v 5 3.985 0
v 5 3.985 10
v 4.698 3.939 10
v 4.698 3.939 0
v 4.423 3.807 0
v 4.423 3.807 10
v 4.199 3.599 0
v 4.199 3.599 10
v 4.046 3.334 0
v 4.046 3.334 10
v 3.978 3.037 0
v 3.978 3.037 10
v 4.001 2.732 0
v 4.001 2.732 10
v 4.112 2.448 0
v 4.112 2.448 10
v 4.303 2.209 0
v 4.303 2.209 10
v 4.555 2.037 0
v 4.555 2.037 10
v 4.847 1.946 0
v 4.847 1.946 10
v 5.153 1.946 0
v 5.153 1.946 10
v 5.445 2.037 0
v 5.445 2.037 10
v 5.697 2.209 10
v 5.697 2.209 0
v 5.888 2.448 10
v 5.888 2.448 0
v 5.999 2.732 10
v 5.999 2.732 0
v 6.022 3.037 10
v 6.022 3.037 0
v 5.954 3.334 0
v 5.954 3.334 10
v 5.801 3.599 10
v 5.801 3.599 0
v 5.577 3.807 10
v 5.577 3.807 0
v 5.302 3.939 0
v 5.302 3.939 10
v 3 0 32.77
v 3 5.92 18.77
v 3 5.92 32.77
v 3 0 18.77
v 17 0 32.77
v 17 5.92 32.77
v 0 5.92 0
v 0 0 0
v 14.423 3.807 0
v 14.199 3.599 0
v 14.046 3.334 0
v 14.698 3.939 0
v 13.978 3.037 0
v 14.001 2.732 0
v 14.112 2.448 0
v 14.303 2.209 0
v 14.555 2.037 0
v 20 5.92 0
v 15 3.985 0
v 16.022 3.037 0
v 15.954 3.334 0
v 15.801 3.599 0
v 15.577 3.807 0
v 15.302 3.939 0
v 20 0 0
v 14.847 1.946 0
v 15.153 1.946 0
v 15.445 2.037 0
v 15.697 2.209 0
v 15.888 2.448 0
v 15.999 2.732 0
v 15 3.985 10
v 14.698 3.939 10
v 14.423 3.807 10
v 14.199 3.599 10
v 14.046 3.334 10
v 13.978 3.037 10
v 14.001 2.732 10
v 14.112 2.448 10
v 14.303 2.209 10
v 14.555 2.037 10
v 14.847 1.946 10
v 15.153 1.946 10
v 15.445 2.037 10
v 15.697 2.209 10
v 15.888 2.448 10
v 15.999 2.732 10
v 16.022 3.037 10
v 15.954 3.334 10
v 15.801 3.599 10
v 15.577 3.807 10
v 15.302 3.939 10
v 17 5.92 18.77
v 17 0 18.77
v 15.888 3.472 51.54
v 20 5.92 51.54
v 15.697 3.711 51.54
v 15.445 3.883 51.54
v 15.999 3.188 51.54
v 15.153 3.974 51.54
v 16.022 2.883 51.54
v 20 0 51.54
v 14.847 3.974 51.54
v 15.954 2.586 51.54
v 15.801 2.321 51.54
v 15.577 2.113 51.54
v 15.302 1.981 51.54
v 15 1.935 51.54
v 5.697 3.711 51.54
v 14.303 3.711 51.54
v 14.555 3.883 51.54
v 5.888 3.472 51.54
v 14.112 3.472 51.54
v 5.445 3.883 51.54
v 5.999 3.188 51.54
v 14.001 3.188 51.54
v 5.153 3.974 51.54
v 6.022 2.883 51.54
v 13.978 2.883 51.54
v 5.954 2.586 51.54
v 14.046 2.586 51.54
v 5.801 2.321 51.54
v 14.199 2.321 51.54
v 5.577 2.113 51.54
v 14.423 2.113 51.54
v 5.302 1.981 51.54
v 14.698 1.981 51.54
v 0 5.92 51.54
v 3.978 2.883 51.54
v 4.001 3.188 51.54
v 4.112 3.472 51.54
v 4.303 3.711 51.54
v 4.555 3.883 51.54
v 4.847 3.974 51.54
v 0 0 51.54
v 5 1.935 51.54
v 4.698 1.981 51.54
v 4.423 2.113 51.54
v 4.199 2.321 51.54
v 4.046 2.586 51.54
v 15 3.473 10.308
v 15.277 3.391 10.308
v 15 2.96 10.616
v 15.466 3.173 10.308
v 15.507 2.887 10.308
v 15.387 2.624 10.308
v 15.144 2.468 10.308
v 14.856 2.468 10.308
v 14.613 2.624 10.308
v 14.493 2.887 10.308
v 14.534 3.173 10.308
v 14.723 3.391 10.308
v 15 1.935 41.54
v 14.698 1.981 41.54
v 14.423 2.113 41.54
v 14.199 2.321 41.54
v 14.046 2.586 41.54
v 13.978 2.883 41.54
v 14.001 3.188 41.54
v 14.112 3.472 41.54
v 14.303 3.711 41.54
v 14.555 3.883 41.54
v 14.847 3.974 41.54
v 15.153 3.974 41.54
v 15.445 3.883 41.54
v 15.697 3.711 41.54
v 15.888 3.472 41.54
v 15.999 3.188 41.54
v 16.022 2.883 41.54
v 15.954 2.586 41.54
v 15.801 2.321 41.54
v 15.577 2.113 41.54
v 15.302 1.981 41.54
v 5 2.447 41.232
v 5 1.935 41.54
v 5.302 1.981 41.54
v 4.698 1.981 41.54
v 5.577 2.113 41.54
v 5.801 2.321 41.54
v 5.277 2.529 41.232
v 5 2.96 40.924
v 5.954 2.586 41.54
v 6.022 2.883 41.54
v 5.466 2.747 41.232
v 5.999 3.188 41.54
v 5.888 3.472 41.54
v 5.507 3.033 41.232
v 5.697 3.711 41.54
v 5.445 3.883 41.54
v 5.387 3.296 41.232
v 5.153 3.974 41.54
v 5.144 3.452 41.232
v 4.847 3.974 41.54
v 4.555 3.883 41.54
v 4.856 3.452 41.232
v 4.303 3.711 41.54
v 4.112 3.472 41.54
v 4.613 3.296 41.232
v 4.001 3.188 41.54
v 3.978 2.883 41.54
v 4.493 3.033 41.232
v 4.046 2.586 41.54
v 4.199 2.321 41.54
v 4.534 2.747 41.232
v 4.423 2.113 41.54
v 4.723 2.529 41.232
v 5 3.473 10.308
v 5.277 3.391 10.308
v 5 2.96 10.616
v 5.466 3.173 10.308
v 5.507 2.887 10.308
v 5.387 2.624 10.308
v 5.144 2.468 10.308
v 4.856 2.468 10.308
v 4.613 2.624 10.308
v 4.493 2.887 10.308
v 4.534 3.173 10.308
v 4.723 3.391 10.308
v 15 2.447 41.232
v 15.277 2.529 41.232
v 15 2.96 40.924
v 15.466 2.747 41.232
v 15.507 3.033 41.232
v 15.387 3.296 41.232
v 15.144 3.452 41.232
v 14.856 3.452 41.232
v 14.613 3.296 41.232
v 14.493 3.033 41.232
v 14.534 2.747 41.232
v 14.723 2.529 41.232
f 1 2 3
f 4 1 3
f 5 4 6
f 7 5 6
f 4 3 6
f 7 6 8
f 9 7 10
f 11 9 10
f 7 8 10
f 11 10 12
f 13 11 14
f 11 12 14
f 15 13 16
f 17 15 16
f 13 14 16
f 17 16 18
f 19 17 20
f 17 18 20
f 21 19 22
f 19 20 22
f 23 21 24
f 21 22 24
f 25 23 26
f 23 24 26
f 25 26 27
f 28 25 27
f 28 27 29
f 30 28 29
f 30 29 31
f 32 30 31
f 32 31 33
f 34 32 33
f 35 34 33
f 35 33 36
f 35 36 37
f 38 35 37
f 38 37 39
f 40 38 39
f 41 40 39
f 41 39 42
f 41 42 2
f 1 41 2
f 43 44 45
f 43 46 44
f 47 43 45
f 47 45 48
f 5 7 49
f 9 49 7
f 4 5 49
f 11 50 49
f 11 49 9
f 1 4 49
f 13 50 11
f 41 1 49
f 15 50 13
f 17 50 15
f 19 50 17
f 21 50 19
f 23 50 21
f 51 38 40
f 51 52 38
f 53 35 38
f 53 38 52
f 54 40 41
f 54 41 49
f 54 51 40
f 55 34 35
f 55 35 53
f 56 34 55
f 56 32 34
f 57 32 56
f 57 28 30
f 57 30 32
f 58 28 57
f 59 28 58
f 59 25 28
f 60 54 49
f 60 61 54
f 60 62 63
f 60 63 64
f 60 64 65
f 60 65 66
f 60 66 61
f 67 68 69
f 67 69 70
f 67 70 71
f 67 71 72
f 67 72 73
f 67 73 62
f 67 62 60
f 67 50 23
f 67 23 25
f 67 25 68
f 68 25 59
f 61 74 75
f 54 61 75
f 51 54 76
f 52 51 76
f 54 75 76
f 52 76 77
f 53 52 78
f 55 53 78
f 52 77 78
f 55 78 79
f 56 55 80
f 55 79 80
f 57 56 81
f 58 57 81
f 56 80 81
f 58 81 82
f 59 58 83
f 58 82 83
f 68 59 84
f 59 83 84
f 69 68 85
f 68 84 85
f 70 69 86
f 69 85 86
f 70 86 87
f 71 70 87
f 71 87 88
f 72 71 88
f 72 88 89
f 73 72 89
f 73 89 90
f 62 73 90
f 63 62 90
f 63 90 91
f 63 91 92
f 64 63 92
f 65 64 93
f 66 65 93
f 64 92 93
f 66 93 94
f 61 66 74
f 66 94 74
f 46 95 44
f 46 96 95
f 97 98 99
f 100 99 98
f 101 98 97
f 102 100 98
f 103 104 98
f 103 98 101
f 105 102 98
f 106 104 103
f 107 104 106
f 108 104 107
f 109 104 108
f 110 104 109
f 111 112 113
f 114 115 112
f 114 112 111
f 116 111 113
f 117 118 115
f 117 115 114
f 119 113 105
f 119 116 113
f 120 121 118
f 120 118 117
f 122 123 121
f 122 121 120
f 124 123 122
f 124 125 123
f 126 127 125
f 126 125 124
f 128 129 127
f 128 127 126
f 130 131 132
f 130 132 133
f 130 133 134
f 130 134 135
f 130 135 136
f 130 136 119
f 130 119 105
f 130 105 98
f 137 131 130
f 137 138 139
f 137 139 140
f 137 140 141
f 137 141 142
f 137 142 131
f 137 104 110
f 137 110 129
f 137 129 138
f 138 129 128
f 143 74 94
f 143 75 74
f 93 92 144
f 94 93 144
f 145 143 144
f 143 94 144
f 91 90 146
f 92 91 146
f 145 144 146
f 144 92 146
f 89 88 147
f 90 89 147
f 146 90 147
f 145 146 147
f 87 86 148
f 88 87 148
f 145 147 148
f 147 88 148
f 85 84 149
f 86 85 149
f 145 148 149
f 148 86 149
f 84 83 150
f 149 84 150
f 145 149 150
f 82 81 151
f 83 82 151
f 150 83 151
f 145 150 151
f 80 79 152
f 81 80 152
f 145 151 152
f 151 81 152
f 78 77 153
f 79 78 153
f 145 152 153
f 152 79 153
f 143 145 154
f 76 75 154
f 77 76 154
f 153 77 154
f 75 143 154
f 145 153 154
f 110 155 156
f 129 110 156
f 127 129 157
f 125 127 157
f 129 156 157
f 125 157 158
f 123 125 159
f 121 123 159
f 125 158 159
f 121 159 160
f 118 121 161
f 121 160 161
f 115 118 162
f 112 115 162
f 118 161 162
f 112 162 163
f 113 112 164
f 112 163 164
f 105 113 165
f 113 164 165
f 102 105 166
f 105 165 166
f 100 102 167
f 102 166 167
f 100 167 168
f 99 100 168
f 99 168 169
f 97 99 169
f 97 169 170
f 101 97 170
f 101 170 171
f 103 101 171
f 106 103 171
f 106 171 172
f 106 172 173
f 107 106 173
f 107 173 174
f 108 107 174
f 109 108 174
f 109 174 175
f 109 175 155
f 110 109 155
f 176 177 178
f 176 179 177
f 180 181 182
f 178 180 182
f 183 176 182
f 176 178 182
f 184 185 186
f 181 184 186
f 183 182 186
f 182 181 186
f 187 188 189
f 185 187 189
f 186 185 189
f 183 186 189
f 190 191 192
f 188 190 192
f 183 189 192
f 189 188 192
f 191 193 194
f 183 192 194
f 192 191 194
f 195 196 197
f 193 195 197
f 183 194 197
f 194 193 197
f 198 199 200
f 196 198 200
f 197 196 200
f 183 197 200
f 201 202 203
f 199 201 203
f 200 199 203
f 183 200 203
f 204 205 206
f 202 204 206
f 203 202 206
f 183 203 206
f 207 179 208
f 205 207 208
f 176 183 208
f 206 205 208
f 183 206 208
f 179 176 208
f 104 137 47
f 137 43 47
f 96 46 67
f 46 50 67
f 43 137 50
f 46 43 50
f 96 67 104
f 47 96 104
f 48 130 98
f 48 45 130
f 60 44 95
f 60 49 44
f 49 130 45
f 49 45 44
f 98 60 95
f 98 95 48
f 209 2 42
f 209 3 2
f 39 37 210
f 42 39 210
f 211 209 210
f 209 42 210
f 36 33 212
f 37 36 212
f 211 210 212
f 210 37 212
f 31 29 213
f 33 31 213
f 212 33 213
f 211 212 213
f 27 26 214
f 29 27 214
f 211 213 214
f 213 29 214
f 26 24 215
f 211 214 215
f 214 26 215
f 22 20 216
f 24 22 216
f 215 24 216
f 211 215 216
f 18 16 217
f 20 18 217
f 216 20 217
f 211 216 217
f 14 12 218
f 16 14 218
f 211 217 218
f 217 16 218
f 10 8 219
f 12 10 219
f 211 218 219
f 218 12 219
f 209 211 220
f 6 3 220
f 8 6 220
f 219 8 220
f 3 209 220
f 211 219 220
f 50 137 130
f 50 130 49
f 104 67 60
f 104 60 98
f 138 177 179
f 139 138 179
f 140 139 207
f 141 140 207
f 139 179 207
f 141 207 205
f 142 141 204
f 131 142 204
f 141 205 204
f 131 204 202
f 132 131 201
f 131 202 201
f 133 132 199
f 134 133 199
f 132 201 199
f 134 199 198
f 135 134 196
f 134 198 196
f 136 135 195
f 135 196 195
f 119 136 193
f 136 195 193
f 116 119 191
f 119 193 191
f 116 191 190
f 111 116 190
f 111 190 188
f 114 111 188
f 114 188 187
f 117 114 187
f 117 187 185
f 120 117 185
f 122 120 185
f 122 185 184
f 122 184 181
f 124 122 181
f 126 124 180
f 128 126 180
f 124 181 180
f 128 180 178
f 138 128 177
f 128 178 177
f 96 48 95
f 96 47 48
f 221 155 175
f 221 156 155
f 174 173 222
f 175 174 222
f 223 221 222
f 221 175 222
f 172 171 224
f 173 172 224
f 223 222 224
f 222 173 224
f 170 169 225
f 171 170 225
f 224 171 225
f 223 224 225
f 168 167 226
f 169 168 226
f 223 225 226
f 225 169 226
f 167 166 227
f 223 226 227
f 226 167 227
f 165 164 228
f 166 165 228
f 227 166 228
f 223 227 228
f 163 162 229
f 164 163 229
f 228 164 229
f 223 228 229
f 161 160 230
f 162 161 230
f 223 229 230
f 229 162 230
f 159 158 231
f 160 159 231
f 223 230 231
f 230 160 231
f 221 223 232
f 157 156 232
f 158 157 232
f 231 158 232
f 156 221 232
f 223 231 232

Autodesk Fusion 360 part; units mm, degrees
sketch "Sketch1" plane through (0, 0, 0) normal (0, 1, 0) x (1, 0, 0)
  line L0 (0, 0) -> (20, 0)
  line L1 (20, 0) -> (20, -51.54)
  line L2 (20, -51.54) -> (0, -51.54)
  line L3 (0, -51.54) -> (0, 0)
  dimension "d1" = 20
  dimension "d2" = 51.54
extrude "Extrude1" add sketch "Sketch1" along normal blind 5.92
sketch "Sketch2" plane through (0, 5.92, 0) normal (0, 1, 0) x (-1, 0, 0)
  line L0 (0, 51.54) -> (-20, 51.54)
  line L1 (-20, 51.54) -> (-20, 0)
  line L2 (-20, 0) -> (0, 0)
  line L3 (0, 0) -> (0, 51.54)
  line L4 (-10, 0) -> (-10, 49) construction
  line L5 (0, 25.77) -> (-20, 25.77) construction
  line L6 (-3, 32.77) -> (-17, 32.77)
  line L7 (-17, 32.77) -> (-17, 18.77)
  line L8 (-17, 18.77) -> (-3, 18.77)
  line L9 (-3, 18.77) -> (-3, 32.77)
  line L10 (-3, 32.77) -> (-17, 18.77) construction
  line L11 (-17, 32.77) -> (-3, 18.77) construction
  point P0 (-10, 25.77)
  dimension "d5" = 14
  dimension "d6" = 14
extrude "Extrude2" cut sketch "Sketch2" along normal through all and the other way through all contours L6 L7 L8 L9
sketch "Sketch3" plane through (0, 0, 51.54) normal (0, 0, 1) x (1, 0, 0)
  line L0 (0, 0) -> (20, 0)
  line L1 (20, 0) -> (20, 5.92)
  line L2 (20, 5.92) -> (0, 5.92)
  line L3 (0, 5.92) -> (0, 0)
  line L4 (10, 5.92) -> (10, 0) construction
  line L5 (20, 2.96) -> (0, 2.96) construction
  point P0 (5, 2.96)
  point P1 (15, 2.96)
  dimension "d12" = 10
  dimension "d13" = 5
hole "Hole1" at (5, 2.96, 51.54) direction (0, 0, -1) diameter 2.05 depth 10 tip angle 118
hole "Hole2" at (15, 2.96, 51.54) direction (0, 0, -1) diameter 2.05 depth 10 tip angle 118
sketch "Sketch4" plane through (0, 0, 0) normal (0, 0, -1) x (-1, 0, 0)
  line L0 (-20, 0) -> (0, 0)
  line L1 (0, 0) -> (0, 5.92)
  line L2 (0, 5.92) -> (-20, 5.92)
  line L3 (-20, 5.92) -> (-20, 0)
  line L4 (-20, 2.96) -> (0, 2.96) construction
  point P0 (-15, 2.96)
  point P1 (-5, 2.96)
  dimension "d30" = 10
  dimension "d31" = 5
hole "Hole5" at (15, 2.96, 0) direction (0, 0, 1) diameter 2.05 depth 10 tip angle 118
hole "Hole6" at (5, 2.96, 0) direction (0, 0, 1) diameter 2.05 depth 10 tip angle 118
